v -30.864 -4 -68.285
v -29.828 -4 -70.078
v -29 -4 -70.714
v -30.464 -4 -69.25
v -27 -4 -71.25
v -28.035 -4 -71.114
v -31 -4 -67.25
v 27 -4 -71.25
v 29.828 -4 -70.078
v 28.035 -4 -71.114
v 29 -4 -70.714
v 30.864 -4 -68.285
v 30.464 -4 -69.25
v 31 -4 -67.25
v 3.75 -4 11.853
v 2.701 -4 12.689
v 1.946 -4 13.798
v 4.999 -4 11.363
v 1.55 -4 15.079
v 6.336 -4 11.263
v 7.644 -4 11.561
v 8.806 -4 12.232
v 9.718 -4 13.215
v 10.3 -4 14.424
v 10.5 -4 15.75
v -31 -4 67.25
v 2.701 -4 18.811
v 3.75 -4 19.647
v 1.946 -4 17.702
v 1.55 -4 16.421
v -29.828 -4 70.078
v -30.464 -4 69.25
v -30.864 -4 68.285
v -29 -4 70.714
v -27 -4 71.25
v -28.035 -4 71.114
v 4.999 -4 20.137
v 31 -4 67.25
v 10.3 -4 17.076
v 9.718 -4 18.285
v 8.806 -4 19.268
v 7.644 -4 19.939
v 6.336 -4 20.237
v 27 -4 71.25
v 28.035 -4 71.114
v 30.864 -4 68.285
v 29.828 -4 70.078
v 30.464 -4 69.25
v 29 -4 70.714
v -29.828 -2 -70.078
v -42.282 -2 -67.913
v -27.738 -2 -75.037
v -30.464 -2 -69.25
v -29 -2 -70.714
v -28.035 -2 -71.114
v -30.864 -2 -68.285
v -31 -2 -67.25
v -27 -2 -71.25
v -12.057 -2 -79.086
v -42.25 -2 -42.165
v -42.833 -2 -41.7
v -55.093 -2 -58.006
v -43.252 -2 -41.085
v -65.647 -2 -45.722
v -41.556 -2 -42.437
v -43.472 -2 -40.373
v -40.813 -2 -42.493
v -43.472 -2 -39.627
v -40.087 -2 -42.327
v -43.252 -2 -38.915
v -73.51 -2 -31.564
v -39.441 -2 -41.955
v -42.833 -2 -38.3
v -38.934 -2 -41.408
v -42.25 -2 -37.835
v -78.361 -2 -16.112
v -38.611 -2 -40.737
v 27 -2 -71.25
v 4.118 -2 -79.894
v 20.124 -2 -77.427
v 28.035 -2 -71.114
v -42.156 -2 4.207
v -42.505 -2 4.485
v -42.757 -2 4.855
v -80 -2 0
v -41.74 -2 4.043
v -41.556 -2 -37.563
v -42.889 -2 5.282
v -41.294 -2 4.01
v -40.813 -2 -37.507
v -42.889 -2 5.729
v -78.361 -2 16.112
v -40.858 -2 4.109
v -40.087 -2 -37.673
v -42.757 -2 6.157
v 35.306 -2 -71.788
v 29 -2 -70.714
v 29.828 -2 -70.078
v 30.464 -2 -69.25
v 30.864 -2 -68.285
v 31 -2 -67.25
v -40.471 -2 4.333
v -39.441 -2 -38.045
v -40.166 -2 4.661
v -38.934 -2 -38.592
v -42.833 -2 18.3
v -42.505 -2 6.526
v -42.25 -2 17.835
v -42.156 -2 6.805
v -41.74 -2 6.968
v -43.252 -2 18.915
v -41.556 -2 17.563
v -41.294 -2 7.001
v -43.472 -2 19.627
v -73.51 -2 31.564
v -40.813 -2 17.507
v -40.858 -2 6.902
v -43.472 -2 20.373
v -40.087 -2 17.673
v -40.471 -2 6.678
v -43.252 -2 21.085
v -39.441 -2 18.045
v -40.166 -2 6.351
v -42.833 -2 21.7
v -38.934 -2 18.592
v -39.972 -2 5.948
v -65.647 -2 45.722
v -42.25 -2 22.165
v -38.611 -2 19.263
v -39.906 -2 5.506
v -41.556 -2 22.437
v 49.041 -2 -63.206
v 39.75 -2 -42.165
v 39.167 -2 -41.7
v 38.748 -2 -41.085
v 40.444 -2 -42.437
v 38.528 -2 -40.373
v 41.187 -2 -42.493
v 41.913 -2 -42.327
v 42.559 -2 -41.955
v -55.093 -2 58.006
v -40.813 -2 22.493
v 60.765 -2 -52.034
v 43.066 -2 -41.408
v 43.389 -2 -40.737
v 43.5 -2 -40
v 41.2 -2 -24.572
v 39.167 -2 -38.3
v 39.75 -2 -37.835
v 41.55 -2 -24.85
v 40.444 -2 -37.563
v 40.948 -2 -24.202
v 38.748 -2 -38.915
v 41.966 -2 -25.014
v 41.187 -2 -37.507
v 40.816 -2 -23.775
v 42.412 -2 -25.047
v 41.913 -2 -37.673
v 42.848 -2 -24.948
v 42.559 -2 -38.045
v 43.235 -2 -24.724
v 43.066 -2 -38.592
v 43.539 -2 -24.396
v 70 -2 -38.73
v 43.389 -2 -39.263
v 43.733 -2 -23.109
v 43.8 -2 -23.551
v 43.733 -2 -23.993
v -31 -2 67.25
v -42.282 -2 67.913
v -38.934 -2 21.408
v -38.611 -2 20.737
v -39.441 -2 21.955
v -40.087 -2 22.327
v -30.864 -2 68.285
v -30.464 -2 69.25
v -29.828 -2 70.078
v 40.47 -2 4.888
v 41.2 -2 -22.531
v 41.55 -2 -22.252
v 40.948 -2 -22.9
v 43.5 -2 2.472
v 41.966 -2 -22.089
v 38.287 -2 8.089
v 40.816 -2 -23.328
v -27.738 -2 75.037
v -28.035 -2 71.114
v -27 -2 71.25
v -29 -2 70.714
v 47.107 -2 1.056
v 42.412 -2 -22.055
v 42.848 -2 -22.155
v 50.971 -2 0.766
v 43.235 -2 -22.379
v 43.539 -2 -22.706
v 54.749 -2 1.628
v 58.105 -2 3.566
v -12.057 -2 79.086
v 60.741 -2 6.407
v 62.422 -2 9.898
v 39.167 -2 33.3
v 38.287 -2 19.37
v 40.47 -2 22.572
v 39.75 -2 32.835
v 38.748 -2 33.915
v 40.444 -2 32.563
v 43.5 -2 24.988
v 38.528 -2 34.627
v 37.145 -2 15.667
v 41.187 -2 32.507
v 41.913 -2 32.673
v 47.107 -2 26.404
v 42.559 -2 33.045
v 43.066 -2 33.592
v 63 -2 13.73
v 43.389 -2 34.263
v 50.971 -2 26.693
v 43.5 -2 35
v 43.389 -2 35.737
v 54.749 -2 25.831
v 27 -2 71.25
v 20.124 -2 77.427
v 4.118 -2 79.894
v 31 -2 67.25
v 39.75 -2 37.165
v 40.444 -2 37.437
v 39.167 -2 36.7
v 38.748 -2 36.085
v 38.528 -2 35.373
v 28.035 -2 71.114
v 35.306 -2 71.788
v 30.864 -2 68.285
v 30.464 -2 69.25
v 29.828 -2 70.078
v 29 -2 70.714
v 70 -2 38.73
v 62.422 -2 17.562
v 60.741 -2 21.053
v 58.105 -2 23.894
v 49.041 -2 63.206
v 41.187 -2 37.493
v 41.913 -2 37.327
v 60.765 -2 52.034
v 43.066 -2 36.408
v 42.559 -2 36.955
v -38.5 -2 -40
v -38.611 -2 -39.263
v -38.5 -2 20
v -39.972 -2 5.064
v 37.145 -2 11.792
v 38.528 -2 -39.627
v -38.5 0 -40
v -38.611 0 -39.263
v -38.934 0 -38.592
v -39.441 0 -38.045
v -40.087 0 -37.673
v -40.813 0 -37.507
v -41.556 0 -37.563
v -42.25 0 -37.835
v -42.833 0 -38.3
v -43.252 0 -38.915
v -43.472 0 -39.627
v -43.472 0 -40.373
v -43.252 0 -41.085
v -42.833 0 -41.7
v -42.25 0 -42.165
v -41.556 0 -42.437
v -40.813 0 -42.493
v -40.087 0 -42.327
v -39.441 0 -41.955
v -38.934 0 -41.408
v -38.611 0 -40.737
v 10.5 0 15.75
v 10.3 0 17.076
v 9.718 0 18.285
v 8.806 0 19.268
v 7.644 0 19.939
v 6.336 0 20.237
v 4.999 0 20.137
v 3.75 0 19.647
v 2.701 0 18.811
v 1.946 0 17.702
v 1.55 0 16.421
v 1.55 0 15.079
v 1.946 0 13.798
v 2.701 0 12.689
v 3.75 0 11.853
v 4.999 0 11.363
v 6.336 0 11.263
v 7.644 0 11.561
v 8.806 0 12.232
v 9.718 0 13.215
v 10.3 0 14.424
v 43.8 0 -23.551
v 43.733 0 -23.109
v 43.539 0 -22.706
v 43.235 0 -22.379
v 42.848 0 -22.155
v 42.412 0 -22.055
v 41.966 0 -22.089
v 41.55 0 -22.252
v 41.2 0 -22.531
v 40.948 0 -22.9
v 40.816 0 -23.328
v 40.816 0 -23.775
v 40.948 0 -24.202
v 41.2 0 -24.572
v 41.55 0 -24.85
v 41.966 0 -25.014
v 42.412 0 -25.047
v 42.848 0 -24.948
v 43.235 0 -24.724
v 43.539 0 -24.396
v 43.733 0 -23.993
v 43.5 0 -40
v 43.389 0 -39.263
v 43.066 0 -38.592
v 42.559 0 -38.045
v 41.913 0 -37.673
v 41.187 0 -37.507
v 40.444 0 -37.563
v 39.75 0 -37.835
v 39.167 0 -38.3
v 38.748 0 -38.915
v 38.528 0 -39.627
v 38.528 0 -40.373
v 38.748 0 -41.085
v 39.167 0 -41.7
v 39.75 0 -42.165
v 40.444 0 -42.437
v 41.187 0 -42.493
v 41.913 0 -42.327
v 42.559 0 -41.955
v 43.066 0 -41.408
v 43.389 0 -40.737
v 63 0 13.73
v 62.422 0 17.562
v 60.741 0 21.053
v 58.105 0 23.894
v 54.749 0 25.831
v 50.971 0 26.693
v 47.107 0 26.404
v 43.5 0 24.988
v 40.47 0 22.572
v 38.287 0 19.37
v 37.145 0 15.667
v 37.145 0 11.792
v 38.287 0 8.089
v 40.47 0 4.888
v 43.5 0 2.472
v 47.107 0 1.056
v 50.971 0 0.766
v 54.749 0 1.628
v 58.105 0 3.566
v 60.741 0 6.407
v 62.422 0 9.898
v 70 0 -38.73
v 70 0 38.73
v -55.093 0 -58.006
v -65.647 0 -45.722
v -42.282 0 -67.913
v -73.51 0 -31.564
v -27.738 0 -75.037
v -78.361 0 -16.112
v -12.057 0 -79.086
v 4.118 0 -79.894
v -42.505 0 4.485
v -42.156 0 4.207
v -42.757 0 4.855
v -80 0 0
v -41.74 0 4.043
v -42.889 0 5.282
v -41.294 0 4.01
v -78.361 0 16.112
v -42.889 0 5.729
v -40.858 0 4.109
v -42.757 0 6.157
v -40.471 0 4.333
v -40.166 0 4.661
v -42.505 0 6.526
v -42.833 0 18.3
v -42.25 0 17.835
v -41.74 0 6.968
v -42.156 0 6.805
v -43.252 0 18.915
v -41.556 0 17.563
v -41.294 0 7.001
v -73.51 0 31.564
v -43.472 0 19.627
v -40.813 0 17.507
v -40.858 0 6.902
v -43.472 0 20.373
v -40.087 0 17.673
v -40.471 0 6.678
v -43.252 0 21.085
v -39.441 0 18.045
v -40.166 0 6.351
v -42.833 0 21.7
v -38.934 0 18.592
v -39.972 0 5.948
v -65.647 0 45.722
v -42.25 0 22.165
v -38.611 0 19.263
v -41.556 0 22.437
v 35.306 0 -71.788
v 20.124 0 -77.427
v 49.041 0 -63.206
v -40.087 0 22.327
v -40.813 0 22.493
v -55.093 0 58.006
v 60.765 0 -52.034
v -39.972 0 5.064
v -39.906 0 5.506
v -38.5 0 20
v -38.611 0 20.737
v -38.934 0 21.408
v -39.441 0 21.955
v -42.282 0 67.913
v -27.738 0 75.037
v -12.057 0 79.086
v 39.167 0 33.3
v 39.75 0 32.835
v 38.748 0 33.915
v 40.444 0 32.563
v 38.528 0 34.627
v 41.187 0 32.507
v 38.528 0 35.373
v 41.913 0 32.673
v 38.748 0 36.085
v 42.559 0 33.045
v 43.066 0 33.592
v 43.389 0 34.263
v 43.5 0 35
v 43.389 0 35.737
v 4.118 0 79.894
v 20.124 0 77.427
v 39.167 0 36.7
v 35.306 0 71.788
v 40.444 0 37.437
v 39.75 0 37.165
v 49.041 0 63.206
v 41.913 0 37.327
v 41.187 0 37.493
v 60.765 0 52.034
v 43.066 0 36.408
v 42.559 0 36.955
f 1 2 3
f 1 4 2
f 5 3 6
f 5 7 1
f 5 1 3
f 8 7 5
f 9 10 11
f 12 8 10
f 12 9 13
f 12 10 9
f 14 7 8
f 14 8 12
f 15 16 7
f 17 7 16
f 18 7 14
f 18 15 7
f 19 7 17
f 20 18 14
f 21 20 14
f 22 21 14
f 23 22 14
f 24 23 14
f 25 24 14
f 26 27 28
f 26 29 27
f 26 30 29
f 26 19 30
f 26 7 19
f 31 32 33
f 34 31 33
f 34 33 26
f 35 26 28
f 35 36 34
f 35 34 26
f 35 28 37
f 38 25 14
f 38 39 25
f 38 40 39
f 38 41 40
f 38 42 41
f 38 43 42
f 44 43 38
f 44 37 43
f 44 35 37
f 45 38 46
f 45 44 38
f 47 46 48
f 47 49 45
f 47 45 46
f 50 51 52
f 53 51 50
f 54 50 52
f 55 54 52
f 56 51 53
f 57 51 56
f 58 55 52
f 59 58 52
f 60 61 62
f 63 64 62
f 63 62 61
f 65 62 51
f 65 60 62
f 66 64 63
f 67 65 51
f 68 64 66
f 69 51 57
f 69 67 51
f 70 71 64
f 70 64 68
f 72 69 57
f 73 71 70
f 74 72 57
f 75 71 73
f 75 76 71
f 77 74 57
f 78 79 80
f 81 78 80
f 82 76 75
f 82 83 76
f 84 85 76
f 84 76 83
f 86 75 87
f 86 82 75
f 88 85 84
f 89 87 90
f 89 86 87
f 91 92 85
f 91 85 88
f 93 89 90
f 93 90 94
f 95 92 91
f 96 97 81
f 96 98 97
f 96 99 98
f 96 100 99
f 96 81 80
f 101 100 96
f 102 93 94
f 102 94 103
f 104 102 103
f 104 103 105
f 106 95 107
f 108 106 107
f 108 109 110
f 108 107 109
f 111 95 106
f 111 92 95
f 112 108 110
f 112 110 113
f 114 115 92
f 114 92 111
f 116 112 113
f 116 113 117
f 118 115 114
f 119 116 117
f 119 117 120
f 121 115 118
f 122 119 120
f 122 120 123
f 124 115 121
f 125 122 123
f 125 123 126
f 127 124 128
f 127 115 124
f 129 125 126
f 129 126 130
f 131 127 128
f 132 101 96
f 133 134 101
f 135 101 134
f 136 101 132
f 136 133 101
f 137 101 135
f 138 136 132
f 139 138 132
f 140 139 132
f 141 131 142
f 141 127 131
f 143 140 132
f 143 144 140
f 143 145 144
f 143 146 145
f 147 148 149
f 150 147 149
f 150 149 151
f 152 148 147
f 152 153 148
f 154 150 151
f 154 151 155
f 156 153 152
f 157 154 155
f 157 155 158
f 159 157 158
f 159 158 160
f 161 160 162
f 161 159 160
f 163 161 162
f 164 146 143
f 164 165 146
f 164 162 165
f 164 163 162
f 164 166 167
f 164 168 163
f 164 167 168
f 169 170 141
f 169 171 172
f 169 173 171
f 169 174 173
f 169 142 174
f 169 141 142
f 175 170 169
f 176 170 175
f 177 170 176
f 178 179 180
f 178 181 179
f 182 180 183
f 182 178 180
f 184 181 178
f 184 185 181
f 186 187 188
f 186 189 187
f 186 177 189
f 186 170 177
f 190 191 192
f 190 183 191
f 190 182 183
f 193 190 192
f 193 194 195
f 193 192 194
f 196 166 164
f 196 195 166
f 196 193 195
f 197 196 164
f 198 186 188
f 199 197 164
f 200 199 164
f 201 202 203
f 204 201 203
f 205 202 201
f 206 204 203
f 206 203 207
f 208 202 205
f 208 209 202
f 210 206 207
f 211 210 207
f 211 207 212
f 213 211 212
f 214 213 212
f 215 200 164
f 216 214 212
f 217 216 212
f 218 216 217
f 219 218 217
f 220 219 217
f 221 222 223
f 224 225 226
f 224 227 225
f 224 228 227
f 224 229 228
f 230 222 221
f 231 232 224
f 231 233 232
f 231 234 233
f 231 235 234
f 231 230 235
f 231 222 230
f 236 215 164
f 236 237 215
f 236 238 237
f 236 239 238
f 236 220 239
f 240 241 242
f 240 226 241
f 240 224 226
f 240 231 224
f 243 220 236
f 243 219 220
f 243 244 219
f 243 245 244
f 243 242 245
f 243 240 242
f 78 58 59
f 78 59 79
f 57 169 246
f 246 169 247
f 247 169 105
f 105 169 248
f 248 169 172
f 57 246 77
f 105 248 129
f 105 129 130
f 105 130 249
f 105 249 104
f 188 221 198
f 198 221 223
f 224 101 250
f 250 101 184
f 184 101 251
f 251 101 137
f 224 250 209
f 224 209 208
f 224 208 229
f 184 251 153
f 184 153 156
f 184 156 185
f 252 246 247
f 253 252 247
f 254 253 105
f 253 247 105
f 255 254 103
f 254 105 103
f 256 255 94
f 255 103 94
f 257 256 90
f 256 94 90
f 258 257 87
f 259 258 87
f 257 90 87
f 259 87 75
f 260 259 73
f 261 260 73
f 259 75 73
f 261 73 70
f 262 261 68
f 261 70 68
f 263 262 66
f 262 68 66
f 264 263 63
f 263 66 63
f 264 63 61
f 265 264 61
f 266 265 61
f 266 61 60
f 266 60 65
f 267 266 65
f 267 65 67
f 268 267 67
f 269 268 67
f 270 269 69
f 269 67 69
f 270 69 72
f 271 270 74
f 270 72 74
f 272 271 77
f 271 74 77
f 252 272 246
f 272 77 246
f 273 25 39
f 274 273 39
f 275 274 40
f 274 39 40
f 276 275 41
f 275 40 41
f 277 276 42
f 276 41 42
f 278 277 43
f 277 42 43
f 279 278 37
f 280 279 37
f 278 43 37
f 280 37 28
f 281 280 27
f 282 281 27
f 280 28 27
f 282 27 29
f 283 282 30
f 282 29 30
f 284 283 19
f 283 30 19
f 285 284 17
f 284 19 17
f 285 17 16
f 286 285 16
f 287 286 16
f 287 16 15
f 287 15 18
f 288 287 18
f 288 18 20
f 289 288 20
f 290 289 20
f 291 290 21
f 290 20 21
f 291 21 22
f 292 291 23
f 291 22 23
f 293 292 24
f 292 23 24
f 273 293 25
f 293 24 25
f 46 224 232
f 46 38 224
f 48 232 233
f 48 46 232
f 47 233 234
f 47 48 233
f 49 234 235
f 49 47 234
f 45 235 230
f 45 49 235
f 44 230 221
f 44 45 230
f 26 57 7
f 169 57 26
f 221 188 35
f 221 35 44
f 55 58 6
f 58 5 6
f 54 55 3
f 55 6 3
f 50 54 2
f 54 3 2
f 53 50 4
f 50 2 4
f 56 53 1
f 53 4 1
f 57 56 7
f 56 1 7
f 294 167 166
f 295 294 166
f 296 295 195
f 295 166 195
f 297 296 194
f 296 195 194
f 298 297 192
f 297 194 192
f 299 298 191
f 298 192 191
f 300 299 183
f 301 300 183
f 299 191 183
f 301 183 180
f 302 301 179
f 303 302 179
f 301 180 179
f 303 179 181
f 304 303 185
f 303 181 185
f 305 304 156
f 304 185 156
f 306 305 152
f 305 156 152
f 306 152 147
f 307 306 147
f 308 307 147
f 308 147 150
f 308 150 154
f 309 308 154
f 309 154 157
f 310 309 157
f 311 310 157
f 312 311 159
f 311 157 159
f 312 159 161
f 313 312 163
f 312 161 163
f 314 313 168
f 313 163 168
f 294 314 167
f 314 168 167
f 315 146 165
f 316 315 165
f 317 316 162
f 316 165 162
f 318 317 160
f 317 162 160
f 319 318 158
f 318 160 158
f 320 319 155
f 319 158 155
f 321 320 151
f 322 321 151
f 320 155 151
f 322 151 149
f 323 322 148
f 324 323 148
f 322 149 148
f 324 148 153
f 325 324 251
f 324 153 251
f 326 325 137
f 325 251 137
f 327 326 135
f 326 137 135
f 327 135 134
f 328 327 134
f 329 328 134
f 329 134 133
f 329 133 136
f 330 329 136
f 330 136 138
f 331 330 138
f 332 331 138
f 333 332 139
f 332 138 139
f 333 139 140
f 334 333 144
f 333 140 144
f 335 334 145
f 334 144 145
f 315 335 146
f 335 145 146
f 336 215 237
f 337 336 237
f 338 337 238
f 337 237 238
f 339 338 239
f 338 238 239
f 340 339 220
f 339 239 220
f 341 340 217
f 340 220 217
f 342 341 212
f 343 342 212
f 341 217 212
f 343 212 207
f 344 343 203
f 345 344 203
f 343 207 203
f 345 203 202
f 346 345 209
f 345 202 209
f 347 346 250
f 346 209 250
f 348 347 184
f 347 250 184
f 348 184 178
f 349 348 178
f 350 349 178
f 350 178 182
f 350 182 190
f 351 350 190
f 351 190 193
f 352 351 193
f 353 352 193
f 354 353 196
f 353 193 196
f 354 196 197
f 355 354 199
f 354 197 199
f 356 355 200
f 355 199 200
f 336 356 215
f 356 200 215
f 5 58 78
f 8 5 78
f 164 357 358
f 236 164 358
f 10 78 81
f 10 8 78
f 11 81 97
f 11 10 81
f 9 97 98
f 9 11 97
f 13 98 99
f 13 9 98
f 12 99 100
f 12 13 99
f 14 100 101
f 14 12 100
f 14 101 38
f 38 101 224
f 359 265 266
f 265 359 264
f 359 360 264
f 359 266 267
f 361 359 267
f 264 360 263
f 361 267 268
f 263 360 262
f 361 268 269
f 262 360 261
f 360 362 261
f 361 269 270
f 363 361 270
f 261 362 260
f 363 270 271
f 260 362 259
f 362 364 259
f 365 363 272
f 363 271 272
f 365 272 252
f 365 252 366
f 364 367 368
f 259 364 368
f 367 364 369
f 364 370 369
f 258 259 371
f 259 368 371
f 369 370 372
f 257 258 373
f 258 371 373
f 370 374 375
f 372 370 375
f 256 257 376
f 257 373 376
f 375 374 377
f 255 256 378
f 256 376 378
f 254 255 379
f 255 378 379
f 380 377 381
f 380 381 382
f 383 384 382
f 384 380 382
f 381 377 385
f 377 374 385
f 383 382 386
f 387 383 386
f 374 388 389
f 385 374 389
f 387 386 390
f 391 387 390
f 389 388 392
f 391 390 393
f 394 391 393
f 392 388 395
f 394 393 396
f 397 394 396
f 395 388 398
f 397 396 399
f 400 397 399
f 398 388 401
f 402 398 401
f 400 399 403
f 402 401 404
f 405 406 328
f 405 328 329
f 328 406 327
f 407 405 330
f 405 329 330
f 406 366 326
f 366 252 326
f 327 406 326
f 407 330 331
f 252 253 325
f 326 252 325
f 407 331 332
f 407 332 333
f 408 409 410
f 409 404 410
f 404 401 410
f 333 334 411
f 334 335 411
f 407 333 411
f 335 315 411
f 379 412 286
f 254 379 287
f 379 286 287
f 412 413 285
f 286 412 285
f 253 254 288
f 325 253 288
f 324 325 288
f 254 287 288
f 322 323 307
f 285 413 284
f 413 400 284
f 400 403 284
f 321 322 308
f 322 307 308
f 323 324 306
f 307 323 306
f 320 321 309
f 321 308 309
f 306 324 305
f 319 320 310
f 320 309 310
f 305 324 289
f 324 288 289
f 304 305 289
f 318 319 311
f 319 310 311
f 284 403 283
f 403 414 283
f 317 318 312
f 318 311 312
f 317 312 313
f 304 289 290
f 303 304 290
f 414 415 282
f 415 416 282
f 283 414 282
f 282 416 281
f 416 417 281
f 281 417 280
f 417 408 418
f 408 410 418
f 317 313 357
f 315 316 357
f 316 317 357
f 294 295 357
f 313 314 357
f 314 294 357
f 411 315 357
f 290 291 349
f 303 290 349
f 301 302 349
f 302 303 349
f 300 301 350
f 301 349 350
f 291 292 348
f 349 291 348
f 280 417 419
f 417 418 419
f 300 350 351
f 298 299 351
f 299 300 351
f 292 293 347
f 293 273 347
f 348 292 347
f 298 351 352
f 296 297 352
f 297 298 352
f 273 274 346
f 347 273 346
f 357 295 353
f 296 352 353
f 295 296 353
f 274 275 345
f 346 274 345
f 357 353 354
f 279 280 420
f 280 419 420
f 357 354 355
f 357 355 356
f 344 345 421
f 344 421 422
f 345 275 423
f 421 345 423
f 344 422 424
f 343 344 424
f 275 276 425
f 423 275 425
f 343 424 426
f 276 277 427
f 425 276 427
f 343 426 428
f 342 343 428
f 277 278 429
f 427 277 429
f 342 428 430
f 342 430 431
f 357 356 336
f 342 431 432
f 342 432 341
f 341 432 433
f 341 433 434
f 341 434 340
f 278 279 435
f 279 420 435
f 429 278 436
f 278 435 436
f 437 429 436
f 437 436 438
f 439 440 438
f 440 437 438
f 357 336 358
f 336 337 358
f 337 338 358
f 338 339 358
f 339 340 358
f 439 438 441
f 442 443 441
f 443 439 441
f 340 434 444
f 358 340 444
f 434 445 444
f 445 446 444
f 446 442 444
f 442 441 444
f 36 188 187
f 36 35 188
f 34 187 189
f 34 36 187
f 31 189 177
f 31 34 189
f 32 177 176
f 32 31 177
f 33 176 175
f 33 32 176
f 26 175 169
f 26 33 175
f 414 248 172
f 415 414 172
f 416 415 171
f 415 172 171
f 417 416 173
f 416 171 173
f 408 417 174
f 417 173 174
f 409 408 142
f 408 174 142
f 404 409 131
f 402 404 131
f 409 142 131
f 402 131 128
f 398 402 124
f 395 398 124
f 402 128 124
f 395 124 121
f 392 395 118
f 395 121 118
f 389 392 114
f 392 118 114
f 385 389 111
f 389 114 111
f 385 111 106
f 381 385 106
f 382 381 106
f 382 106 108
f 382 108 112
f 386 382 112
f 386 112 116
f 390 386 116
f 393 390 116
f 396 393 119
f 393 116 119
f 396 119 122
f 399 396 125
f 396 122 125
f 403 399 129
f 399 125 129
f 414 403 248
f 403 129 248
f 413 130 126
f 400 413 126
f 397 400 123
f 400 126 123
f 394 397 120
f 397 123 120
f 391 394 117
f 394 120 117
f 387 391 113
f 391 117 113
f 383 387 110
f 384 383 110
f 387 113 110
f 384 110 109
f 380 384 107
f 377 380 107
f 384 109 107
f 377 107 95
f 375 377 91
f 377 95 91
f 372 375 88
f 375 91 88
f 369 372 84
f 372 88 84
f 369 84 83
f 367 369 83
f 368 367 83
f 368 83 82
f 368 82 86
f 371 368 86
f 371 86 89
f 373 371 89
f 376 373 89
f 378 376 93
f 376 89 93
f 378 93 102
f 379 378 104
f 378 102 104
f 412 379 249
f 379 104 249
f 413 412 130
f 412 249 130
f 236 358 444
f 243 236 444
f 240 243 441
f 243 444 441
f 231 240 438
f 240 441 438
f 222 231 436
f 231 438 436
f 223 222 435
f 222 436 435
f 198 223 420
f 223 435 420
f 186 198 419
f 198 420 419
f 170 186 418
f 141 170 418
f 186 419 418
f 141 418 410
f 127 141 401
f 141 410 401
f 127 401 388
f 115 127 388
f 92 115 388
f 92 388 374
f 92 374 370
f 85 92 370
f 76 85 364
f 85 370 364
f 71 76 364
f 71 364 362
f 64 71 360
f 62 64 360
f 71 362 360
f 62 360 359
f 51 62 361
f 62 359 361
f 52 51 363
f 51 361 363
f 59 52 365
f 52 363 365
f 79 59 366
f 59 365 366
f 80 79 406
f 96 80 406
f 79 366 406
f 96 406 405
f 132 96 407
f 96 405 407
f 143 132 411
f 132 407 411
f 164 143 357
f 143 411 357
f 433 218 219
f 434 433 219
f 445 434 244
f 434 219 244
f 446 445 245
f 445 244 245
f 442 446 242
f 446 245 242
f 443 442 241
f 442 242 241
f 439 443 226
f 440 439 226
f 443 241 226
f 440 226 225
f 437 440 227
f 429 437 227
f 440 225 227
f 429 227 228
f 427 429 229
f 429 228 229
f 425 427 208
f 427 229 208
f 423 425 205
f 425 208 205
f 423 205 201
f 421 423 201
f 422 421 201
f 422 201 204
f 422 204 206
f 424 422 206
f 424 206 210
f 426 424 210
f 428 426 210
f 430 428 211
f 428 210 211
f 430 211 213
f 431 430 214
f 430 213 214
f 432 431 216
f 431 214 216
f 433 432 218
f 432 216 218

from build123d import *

# Parameters (mm, degrees)
F1_DEPTH  = 2
F2_W      = 62
F2_H      = 142.5
F3_DEPTH  = 2
F4_R      = 4
F5_R      = 4.5
F6_DEPTH  = 4
F7_R      = 13
F8_DEPTH  = 2
F9_R      = 2.5
F10_DEPTH = 2
F11_R     = 1.5
F12_DEPTH = 2


with BuildPart() as f1:
    # F0 (on Front) → F1 (new body)
    with BuildSketch(Plane.XZ):
        with BuildLine():
            ThreePointArc((70, 38.729833), (-80, 0), (70, -38.729833))
            Line((70, -38.729833), (70, 38.729833))
        make_face()
    extrude(amount=F1_DEPTH)

    # F2 (on face) → F3 (join)
    with BuildSketch(Plane.XZ.offset(2)):
        Rectangle(F2_W, F2_H)
    extrude(amount=F3_DEPTH)

    # F4
    f4_edges = [f1.edges().sort_by_distance(p)[0] for p in [
        (-31, -3, -71.25),
        (31, -3, -71.25),
        (31, -3, 71.25),
        (-31, -3, 71.25),
    ]]
    fillet(f4_edges, radius=F4_R)

    # F5 (on face) → F6 (cut)
    with BuildSketch(Plane.XZ.offset(4)):
        with Locations((6, 15.75)):
            Circle(F5_R)
    extrude(amount=-F6_DEPTH, mode=Mode.SUBTRACT)

    # F7 (on face) → F8 (cut)
    with BuildSketch(Plane.XZ.offset(2)):
        with Locations((50, 13.729833)):
            Circle(F7_R)
    extrude(amount=-F8_DEPTH, mode=Mode.SUBTRACT)

    # F9 (on face) → F10 (cut)
    with BuildSketch(Plane.XZ.offset(2)):
        with Locations((-41, 20)):
            Circle(F9_R)
        with Locations((-41, -40)):
            Circle(F9_R)
        with Locations((41, 35)):
            Circle(F9_R)
        with Locations((41, -40)):
            Circle(F9_R)
    extrude(amount=-F10_DEPTH, mode=Mode.SUBTRACT)

    # F11 (on face) → F12 (cut)
    with BuildSketch(Plane.XZ.offset(2)):
        with Locations((-41.405737, 5.505678)):
            Circle(F11_R)
        with Locations((42.2996, -23.55126)):
            Circle(F11_R)
    extrude(amount=-F12_DEPTH, mode=Mode.SUBTRACT)


solid = f1.part
